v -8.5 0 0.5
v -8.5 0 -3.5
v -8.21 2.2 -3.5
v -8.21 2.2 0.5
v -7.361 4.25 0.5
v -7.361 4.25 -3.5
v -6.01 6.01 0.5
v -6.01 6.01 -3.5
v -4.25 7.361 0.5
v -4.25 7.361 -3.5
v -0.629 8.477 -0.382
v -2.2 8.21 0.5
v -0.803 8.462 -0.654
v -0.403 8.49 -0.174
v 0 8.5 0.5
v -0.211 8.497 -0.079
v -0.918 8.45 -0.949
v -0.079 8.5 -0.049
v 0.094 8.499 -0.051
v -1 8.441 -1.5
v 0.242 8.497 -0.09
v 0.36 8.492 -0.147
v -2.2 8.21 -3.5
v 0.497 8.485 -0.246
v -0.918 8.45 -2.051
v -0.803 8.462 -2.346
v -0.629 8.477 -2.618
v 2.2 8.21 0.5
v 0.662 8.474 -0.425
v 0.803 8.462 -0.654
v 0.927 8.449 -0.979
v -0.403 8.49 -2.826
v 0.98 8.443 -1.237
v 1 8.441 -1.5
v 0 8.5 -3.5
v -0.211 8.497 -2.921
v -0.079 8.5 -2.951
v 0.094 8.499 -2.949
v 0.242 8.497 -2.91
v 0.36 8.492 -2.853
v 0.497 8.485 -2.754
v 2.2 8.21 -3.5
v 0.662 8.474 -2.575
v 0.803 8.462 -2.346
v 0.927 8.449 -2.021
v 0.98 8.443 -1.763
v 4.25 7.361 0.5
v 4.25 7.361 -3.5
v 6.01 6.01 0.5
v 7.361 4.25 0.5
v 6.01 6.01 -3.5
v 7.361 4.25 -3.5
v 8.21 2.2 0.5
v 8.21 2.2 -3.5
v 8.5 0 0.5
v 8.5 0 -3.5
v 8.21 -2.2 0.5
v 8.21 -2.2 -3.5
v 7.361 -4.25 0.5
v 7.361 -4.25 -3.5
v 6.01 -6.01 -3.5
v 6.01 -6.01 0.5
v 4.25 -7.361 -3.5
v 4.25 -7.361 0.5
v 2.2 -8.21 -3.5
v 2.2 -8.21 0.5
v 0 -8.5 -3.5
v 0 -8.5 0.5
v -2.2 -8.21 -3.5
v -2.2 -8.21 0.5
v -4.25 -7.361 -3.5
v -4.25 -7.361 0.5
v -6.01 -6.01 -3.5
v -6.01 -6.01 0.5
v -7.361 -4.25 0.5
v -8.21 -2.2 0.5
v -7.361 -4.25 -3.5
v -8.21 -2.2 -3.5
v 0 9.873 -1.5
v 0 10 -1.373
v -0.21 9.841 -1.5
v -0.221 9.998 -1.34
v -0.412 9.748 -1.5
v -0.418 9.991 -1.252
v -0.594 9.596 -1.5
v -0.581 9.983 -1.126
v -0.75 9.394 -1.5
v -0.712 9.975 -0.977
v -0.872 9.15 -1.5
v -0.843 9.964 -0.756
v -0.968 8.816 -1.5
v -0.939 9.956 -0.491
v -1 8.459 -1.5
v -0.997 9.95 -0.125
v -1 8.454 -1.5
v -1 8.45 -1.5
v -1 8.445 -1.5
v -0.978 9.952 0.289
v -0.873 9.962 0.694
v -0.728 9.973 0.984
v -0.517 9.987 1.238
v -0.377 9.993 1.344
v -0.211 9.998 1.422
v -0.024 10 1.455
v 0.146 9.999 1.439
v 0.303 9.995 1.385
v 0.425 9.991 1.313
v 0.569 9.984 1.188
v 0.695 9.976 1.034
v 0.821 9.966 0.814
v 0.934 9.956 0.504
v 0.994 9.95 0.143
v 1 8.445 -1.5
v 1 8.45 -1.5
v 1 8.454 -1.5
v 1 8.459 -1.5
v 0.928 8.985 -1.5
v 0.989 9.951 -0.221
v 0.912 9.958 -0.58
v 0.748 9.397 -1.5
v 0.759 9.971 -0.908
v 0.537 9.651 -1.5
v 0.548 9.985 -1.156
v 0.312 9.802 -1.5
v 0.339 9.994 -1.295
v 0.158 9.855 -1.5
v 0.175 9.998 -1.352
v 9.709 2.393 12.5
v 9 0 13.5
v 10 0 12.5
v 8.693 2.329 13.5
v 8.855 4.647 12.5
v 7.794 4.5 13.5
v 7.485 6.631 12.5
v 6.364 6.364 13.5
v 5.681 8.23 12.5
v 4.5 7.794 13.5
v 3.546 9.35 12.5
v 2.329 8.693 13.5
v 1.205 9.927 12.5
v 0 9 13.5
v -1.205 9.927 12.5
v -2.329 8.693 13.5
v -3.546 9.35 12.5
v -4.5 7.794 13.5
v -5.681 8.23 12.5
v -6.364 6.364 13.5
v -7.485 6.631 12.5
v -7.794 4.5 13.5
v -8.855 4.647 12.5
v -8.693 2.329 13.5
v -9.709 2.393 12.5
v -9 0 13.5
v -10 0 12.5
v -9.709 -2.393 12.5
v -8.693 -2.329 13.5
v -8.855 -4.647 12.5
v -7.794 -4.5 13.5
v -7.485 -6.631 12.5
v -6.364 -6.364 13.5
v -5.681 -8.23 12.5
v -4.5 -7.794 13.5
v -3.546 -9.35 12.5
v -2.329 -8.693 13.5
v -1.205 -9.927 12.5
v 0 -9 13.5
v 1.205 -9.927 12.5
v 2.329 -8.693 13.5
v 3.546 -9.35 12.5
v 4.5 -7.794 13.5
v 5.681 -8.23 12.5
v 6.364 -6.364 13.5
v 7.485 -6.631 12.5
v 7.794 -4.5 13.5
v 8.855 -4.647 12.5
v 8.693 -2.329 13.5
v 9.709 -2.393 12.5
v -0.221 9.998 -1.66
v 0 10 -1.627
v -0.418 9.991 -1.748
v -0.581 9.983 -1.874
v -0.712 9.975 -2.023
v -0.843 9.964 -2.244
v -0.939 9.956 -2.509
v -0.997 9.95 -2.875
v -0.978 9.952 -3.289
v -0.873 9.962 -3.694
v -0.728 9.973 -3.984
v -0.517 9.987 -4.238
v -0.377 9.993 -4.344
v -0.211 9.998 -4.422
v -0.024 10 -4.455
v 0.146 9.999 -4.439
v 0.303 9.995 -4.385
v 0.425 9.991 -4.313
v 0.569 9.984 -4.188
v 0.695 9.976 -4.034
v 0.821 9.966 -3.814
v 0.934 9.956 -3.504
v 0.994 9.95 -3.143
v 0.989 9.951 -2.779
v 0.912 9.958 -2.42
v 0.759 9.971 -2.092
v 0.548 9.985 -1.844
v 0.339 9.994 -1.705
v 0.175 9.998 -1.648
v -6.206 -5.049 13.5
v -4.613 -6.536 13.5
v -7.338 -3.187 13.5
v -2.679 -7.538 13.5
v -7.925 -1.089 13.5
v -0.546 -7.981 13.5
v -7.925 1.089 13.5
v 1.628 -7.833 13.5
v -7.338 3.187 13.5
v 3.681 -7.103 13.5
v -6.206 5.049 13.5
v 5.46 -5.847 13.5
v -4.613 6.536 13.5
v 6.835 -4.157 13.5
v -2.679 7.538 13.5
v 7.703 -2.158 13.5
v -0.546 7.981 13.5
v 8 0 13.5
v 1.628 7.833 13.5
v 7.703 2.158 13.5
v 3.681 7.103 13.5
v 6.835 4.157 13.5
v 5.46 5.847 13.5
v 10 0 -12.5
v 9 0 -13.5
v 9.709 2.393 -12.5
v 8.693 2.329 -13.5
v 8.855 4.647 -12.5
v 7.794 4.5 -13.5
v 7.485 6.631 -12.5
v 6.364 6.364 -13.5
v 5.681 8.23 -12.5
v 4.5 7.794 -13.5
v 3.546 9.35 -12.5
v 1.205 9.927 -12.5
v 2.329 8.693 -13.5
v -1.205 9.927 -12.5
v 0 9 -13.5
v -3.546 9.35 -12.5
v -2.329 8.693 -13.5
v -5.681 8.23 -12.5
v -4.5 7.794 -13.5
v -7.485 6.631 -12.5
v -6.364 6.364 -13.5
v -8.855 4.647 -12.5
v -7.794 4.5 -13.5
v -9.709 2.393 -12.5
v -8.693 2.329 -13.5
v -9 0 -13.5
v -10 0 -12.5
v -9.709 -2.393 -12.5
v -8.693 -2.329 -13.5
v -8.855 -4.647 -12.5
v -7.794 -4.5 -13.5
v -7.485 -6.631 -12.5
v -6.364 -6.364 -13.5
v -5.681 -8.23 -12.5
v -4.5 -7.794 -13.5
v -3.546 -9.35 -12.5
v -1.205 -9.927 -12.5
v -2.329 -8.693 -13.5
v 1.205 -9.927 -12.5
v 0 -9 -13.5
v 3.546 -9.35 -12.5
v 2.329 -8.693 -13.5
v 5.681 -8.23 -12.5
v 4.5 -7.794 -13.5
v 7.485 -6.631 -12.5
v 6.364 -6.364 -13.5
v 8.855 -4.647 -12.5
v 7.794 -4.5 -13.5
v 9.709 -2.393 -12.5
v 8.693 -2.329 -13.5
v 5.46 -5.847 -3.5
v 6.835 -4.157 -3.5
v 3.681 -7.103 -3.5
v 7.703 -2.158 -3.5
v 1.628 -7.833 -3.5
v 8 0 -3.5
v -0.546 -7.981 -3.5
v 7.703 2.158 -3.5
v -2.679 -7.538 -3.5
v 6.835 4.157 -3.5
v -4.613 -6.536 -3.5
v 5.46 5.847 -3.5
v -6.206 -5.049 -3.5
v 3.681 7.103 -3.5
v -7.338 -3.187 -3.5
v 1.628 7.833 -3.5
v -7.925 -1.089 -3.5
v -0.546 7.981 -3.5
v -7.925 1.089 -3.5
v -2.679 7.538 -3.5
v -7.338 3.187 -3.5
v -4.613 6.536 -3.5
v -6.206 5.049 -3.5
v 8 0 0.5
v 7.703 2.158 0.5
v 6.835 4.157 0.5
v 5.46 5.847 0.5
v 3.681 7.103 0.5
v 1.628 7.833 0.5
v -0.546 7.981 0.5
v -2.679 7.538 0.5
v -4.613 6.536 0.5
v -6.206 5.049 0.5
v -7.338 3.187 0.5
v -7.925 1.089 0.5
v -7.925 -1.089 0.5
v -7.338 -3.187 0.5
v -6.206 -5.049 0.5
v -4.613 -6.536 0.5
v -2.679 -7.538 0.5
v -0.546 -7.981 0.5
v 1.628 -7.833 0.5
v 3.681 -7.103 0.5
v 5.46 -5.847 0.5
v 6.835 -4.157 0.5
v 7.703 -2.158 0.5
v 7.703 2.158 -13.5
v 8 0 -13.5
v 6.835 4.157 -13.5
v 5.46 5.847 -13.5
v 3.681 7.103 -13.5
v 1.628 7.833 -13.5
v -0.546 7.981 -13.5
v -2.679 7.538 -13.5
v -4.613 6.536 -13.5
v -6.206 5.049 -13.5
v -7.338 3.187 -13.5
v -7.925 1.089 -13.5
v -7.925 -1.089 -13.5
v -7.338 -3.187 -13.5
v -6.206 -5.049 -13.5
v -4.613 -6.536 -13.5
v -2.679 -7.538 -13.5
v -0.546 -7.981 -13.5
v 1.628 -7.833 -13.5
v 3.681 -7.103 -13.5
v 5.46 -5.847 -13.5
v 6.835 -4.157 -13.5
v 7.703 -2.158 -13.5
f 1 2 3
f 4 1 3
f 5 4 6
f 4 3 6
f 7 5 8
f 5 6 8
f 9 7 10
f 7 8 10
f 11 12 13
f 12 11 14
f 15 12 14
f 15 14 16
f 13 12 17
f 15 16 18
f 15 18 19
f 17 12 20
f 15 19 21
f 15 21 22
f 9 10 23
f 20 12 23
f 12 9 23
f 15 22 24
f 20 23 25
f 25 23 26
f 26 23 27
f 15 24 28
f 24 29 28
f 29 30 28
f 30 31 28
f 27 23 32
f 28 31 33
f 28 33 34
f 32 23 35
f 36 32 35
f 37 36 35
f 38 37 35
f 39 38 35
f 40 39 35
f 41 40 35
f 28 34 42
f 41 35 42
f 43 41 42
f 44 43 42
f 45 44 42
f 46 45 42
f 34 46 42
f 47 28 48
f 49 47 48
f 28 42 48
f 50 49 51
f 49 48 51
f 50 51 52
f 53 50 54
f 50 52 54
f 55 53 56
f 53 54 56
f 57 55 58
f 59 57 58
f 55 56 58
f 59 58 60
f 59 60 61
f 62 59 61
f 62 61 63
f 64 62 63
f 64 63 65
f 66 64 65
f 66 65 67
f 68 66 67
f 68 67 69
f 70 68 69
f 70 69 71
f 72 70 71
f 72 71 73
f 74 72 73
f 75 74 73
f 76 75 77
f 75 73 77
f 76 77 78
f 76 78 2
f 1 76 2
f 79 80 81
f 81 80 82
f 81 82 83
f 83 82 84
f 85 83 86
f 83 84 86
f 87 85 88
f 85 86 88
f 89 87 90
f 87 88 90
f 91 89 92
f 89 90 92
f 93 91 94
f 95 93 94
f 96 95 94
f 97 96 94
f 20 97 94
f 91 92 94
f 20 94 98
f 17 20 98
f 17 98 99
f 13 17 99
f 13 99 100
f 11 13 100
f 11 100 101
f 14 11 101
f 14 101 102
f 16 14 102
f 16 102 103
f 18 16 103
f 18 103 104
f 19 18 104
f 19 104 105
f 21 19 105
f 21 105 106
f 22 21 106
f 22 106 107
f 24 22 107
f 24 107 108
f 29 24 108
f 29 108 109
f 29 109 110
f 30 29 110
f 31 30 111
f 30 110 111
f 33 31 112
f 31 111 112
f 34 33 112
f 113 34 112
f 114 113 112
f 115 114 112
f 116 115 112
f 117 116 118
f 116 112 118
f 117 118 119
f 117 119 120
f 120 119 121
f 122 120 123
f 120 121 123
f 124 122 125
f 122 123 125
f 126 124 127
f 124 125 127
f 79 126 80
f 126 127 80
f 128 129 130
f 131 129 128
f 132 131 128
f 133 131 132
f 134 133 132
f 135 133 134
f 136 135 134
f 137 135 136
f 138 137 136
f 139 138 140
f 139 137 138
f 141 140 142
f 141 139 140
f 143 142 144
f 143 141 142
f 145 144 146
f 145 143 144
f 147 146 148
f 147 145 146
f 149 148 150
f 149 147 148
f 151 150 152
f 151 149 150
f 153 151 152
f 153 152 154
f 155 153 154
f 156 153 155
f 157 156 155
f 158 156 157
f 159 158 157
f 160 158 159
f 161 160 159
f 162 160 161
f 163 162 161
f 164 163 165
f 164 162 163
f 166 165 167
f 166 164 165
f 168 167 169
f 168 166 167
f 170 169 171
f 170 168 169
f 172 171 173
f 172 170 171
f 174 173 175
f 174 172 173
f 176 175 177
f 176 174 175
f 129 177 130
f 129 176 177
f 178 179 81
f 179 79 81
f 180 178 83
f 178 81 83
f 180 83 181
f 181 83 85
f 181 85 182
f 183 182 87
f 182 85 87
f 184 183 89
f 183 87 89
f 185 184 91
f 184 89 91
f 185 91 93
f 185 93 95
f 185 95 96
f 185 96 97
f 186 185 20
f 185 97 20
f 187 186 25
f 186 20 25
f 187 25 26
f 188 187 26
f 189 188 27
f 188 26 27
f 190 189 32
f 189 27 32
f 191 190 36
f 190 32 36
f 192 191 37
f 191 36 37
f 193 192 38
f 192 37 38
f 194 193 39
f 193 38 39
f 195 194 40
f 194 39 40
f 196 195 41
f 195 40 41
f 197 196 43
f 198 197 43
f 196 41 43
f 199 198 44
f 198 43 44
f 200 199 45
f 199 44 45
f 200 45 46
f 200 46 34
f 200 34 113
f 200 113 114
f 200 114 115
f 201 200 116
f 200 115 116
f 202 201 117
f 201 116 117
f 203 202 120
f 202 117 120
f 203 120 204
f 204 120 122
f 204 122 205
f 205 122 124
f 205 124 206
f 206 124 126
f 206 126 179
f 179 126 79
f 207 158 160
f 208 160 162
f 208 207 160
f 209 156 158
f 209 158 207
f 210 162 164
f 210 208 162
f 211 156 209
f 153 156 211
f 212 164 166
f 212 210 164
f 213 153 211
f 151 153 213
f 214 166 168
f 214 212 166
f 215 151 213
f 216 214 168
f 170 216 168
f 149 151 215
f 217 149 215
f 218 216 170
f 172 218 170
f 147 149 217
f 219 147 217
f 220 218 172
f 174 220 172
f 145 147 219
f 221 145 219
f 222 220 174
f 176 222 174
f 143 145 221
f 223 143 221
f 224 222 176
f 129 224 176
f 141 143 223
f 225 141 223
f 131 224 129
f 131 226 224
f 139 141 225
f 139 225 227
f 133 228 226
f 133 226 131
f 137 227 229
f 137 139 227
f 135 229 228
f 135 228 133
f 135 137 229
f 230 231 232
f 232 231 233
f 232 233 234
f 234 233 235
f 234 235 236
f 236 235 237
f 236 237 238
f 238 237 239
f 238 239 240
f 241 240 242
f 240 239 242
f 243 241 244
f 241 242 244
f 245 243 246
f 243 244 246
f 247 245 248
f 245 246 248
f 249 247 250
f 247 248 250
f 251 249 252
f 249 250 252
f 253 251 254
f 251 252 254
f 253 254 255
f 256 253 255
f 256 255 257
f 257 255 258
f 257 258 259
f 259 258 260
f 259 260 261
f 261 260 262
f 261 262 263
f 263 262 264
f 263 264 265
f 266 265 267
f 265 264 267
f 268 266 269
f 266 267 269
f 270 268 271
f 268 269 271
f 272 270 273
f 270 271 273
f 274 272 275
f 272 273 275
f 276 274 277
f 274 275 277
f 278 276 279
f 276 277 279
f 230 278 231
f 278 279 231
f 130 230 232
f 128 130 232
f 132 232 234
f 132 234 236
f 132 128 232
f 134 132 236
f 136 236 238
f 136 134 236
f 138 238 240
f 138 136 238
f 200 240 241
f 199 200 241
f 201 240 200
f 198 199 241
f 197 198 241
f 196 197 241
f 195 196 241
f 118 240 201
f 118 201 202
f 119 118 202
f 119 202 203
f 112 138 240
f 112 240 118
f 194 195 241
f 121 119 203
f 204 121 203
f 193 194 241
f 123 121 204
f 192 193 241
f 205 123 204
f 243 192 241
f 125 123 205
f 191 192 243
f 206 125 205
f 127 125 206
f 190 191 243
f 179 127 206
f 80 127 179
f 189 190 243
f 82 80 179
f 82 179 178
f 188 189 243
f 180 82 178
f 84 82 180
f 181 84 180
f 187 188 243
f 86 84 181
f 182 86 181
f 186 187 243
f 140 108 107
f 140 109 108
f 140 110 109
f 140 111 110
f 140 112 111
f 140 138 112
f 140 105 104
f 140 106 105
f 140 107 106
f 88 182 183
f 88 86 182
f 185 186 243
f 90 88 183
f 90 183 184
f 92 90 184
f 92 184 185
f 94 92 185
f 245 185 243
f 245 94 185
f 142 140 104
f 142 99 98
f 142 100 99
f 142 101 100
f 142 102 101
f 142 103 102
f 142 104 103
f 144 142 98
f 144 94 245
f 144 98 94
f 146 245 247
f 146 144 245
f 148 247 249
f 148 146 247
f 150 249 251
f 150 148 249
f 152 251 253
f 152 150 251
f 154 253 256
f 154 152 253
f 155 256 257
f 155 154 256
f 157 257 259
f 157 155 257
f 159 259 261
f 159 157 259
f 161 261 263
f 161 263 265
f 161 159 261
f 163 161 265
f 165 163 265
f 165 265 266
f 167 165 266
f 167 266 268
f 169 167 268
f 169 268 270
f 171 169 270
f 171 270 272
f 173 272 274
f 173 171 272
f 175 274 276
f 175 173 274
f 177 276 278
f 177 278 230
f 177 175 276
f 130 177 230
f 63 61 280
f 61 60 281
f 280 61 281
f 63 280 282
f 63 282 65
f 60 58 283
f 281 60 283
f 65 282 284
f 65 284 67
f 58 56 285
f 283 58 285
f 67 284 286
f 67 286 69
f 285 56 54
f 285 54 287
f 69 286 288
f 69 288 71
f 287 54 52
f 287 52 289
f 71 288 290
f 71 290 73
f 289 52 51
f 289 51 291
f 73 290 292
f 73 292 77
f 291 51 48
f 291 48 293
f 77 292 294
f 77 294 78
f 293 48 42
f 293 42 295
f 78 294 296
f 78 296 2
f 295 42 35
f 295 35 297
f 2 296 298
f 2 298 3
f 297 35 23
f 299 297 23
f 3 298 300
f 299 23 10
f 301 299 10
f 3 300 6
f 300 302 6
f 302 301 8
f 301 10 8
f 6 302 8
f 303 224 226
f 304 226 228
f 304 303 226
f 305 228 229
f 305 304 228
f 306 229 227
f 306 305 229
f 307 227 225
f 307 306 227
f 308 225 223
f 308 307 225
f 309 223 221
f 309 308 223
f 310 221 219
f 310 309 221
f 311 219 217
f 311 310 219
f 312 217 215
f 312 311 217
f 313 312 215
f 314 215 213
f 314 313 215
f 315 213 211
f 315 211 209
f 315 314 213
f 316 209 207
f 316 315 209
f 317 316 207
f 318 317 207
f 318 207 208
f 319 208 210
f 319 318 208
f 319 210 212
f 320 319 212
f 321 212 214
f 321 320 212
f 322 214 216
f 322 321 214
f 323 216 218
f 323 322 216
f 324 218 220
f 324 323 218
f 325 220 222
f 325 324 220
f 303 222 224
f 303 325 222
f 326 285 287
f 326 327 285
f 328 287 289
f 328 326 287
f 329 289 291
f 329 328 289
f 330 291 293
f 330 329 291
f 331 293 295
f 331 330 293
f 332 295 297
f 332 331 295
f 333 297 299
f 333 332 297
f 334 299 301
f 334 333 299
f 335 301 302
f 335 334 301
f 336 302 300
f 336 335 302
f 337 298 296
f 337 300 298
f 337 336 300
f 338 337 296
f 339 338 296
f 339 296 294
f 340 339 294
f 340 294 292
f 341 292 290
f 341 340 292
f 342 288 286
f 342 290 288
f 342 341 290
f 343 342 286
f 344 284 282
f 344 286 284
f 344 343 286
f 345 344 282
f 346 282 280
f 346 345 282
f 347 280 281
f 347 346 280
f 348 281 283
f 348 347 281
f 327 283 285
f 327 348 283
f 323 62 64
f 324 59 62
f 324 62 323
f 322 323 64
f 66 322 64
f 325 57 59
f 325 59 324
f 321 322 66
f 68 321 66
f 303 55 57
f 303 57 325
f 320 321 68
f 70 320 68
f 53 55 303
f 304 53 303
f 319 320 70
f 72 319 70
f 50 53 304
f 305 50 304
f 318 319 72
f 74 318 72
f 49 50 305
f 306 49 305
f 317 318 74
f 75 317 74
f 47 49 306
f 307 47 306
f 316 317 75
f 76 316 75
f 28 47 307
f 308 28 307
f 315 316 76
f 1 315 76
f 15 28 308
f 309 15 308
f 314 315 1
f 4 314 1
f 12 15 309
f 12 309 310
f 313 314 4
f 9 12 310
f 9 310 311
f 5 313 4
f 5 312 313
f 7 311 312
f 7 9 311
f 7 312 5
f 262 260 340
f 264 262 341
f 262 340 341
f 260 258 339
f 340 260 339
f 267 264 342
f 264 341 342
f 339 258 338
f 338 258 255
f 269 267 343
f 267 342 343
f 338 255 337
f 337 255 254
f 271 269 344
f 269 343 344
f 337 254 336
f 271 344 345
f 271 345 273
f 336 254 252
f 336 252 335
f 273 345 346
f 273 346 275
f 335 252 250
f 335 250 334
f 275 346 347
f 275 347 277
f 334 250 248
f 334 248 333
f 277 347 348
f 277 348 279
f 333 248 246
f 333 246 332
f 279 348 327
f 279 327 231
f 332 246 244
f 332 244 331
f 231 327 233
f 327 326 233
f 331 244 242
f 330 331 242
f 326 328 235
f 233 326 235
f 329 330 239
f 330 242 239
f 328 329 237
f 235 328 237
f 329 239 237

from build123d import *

# Parameters (mm, degrees)
SKETCH_1_R          = 10
SKETCH_1_R_2        = 8
EXTRUDE_1_DEPTH     = 13.5
CHAMFER_1_SIZE      = 1
CUT_EXTRUDE_START   = -10
SKETCH_2_R          = 8.5
CUT_EXTRUDE_1_DEPTH = 4
SWEEP_1_PROFILE_R   = 1


with BuildPart() as part:
    # 草图1 → 凸台-拉伸1 (new, symmetric)
    with BuildSketch(Plane.XY):
        Circle(SKETCH_1_R)
        Circle(SKETCH_1_R_2, mode=Mode.SUBTRACT)
    extrude(amount=EXTRUDE_1_DEPTH, both=True)

    # 倒角1
    chamfer_1_edges = [part.edges().sort_by_distance(p)[0] for p in [
        (-10, 0, -13.5),
        (-10, 0, 13.5),
    ]]
    chamfer(chamfer_1_edges, length=CHAMFER_1_SIZE)

    # 草图2 → 切除-拉伸1 (cut)
    with BuildSketch(Plane(origin=(0, 0, -13.5), x_dir=(-1, 0, 0), z_dir=(0, 0, -1)).offset(CUT_EXTRUDE_START)):
        Circle(SKETCH_2_R)
    extrude(amount=-CUT_EXTRUDE_1_DEPTH, mode=Mode.SUBTRACT)

    # 切除-扫描1: sweep along a path in 草图3
    with BuildLine(Plane(origin=(0, 0, 0), x_dir=(0, 0, -1), z_dir=(1, 0, 0))) as sweep_1_path:
        Line((5.960249648, 12.918859865), (1.5, 8.458610217))
        Line((1.5, 8.458610217), (-2.960249648, 12.918859865))
    # 切除-扫描1 profile (on start of the path) → 切除-扫描1 (sweep, cut)
    with BuildSketch(Plane(origin=(0, 12.918859865, -5.960249648), x_dir=(0, 0.7071067811865478, 0.7071067811865472), z_dir=(0, -0.7071067811865472, 0.7071067811865478))):
        Circle(SWEEP_1_PROFILE_R)
    sweep(path=sweep_1_path.line, transition=Transition.RIGHT, mode=Mode.SUBTRACT)


solid = part.part
